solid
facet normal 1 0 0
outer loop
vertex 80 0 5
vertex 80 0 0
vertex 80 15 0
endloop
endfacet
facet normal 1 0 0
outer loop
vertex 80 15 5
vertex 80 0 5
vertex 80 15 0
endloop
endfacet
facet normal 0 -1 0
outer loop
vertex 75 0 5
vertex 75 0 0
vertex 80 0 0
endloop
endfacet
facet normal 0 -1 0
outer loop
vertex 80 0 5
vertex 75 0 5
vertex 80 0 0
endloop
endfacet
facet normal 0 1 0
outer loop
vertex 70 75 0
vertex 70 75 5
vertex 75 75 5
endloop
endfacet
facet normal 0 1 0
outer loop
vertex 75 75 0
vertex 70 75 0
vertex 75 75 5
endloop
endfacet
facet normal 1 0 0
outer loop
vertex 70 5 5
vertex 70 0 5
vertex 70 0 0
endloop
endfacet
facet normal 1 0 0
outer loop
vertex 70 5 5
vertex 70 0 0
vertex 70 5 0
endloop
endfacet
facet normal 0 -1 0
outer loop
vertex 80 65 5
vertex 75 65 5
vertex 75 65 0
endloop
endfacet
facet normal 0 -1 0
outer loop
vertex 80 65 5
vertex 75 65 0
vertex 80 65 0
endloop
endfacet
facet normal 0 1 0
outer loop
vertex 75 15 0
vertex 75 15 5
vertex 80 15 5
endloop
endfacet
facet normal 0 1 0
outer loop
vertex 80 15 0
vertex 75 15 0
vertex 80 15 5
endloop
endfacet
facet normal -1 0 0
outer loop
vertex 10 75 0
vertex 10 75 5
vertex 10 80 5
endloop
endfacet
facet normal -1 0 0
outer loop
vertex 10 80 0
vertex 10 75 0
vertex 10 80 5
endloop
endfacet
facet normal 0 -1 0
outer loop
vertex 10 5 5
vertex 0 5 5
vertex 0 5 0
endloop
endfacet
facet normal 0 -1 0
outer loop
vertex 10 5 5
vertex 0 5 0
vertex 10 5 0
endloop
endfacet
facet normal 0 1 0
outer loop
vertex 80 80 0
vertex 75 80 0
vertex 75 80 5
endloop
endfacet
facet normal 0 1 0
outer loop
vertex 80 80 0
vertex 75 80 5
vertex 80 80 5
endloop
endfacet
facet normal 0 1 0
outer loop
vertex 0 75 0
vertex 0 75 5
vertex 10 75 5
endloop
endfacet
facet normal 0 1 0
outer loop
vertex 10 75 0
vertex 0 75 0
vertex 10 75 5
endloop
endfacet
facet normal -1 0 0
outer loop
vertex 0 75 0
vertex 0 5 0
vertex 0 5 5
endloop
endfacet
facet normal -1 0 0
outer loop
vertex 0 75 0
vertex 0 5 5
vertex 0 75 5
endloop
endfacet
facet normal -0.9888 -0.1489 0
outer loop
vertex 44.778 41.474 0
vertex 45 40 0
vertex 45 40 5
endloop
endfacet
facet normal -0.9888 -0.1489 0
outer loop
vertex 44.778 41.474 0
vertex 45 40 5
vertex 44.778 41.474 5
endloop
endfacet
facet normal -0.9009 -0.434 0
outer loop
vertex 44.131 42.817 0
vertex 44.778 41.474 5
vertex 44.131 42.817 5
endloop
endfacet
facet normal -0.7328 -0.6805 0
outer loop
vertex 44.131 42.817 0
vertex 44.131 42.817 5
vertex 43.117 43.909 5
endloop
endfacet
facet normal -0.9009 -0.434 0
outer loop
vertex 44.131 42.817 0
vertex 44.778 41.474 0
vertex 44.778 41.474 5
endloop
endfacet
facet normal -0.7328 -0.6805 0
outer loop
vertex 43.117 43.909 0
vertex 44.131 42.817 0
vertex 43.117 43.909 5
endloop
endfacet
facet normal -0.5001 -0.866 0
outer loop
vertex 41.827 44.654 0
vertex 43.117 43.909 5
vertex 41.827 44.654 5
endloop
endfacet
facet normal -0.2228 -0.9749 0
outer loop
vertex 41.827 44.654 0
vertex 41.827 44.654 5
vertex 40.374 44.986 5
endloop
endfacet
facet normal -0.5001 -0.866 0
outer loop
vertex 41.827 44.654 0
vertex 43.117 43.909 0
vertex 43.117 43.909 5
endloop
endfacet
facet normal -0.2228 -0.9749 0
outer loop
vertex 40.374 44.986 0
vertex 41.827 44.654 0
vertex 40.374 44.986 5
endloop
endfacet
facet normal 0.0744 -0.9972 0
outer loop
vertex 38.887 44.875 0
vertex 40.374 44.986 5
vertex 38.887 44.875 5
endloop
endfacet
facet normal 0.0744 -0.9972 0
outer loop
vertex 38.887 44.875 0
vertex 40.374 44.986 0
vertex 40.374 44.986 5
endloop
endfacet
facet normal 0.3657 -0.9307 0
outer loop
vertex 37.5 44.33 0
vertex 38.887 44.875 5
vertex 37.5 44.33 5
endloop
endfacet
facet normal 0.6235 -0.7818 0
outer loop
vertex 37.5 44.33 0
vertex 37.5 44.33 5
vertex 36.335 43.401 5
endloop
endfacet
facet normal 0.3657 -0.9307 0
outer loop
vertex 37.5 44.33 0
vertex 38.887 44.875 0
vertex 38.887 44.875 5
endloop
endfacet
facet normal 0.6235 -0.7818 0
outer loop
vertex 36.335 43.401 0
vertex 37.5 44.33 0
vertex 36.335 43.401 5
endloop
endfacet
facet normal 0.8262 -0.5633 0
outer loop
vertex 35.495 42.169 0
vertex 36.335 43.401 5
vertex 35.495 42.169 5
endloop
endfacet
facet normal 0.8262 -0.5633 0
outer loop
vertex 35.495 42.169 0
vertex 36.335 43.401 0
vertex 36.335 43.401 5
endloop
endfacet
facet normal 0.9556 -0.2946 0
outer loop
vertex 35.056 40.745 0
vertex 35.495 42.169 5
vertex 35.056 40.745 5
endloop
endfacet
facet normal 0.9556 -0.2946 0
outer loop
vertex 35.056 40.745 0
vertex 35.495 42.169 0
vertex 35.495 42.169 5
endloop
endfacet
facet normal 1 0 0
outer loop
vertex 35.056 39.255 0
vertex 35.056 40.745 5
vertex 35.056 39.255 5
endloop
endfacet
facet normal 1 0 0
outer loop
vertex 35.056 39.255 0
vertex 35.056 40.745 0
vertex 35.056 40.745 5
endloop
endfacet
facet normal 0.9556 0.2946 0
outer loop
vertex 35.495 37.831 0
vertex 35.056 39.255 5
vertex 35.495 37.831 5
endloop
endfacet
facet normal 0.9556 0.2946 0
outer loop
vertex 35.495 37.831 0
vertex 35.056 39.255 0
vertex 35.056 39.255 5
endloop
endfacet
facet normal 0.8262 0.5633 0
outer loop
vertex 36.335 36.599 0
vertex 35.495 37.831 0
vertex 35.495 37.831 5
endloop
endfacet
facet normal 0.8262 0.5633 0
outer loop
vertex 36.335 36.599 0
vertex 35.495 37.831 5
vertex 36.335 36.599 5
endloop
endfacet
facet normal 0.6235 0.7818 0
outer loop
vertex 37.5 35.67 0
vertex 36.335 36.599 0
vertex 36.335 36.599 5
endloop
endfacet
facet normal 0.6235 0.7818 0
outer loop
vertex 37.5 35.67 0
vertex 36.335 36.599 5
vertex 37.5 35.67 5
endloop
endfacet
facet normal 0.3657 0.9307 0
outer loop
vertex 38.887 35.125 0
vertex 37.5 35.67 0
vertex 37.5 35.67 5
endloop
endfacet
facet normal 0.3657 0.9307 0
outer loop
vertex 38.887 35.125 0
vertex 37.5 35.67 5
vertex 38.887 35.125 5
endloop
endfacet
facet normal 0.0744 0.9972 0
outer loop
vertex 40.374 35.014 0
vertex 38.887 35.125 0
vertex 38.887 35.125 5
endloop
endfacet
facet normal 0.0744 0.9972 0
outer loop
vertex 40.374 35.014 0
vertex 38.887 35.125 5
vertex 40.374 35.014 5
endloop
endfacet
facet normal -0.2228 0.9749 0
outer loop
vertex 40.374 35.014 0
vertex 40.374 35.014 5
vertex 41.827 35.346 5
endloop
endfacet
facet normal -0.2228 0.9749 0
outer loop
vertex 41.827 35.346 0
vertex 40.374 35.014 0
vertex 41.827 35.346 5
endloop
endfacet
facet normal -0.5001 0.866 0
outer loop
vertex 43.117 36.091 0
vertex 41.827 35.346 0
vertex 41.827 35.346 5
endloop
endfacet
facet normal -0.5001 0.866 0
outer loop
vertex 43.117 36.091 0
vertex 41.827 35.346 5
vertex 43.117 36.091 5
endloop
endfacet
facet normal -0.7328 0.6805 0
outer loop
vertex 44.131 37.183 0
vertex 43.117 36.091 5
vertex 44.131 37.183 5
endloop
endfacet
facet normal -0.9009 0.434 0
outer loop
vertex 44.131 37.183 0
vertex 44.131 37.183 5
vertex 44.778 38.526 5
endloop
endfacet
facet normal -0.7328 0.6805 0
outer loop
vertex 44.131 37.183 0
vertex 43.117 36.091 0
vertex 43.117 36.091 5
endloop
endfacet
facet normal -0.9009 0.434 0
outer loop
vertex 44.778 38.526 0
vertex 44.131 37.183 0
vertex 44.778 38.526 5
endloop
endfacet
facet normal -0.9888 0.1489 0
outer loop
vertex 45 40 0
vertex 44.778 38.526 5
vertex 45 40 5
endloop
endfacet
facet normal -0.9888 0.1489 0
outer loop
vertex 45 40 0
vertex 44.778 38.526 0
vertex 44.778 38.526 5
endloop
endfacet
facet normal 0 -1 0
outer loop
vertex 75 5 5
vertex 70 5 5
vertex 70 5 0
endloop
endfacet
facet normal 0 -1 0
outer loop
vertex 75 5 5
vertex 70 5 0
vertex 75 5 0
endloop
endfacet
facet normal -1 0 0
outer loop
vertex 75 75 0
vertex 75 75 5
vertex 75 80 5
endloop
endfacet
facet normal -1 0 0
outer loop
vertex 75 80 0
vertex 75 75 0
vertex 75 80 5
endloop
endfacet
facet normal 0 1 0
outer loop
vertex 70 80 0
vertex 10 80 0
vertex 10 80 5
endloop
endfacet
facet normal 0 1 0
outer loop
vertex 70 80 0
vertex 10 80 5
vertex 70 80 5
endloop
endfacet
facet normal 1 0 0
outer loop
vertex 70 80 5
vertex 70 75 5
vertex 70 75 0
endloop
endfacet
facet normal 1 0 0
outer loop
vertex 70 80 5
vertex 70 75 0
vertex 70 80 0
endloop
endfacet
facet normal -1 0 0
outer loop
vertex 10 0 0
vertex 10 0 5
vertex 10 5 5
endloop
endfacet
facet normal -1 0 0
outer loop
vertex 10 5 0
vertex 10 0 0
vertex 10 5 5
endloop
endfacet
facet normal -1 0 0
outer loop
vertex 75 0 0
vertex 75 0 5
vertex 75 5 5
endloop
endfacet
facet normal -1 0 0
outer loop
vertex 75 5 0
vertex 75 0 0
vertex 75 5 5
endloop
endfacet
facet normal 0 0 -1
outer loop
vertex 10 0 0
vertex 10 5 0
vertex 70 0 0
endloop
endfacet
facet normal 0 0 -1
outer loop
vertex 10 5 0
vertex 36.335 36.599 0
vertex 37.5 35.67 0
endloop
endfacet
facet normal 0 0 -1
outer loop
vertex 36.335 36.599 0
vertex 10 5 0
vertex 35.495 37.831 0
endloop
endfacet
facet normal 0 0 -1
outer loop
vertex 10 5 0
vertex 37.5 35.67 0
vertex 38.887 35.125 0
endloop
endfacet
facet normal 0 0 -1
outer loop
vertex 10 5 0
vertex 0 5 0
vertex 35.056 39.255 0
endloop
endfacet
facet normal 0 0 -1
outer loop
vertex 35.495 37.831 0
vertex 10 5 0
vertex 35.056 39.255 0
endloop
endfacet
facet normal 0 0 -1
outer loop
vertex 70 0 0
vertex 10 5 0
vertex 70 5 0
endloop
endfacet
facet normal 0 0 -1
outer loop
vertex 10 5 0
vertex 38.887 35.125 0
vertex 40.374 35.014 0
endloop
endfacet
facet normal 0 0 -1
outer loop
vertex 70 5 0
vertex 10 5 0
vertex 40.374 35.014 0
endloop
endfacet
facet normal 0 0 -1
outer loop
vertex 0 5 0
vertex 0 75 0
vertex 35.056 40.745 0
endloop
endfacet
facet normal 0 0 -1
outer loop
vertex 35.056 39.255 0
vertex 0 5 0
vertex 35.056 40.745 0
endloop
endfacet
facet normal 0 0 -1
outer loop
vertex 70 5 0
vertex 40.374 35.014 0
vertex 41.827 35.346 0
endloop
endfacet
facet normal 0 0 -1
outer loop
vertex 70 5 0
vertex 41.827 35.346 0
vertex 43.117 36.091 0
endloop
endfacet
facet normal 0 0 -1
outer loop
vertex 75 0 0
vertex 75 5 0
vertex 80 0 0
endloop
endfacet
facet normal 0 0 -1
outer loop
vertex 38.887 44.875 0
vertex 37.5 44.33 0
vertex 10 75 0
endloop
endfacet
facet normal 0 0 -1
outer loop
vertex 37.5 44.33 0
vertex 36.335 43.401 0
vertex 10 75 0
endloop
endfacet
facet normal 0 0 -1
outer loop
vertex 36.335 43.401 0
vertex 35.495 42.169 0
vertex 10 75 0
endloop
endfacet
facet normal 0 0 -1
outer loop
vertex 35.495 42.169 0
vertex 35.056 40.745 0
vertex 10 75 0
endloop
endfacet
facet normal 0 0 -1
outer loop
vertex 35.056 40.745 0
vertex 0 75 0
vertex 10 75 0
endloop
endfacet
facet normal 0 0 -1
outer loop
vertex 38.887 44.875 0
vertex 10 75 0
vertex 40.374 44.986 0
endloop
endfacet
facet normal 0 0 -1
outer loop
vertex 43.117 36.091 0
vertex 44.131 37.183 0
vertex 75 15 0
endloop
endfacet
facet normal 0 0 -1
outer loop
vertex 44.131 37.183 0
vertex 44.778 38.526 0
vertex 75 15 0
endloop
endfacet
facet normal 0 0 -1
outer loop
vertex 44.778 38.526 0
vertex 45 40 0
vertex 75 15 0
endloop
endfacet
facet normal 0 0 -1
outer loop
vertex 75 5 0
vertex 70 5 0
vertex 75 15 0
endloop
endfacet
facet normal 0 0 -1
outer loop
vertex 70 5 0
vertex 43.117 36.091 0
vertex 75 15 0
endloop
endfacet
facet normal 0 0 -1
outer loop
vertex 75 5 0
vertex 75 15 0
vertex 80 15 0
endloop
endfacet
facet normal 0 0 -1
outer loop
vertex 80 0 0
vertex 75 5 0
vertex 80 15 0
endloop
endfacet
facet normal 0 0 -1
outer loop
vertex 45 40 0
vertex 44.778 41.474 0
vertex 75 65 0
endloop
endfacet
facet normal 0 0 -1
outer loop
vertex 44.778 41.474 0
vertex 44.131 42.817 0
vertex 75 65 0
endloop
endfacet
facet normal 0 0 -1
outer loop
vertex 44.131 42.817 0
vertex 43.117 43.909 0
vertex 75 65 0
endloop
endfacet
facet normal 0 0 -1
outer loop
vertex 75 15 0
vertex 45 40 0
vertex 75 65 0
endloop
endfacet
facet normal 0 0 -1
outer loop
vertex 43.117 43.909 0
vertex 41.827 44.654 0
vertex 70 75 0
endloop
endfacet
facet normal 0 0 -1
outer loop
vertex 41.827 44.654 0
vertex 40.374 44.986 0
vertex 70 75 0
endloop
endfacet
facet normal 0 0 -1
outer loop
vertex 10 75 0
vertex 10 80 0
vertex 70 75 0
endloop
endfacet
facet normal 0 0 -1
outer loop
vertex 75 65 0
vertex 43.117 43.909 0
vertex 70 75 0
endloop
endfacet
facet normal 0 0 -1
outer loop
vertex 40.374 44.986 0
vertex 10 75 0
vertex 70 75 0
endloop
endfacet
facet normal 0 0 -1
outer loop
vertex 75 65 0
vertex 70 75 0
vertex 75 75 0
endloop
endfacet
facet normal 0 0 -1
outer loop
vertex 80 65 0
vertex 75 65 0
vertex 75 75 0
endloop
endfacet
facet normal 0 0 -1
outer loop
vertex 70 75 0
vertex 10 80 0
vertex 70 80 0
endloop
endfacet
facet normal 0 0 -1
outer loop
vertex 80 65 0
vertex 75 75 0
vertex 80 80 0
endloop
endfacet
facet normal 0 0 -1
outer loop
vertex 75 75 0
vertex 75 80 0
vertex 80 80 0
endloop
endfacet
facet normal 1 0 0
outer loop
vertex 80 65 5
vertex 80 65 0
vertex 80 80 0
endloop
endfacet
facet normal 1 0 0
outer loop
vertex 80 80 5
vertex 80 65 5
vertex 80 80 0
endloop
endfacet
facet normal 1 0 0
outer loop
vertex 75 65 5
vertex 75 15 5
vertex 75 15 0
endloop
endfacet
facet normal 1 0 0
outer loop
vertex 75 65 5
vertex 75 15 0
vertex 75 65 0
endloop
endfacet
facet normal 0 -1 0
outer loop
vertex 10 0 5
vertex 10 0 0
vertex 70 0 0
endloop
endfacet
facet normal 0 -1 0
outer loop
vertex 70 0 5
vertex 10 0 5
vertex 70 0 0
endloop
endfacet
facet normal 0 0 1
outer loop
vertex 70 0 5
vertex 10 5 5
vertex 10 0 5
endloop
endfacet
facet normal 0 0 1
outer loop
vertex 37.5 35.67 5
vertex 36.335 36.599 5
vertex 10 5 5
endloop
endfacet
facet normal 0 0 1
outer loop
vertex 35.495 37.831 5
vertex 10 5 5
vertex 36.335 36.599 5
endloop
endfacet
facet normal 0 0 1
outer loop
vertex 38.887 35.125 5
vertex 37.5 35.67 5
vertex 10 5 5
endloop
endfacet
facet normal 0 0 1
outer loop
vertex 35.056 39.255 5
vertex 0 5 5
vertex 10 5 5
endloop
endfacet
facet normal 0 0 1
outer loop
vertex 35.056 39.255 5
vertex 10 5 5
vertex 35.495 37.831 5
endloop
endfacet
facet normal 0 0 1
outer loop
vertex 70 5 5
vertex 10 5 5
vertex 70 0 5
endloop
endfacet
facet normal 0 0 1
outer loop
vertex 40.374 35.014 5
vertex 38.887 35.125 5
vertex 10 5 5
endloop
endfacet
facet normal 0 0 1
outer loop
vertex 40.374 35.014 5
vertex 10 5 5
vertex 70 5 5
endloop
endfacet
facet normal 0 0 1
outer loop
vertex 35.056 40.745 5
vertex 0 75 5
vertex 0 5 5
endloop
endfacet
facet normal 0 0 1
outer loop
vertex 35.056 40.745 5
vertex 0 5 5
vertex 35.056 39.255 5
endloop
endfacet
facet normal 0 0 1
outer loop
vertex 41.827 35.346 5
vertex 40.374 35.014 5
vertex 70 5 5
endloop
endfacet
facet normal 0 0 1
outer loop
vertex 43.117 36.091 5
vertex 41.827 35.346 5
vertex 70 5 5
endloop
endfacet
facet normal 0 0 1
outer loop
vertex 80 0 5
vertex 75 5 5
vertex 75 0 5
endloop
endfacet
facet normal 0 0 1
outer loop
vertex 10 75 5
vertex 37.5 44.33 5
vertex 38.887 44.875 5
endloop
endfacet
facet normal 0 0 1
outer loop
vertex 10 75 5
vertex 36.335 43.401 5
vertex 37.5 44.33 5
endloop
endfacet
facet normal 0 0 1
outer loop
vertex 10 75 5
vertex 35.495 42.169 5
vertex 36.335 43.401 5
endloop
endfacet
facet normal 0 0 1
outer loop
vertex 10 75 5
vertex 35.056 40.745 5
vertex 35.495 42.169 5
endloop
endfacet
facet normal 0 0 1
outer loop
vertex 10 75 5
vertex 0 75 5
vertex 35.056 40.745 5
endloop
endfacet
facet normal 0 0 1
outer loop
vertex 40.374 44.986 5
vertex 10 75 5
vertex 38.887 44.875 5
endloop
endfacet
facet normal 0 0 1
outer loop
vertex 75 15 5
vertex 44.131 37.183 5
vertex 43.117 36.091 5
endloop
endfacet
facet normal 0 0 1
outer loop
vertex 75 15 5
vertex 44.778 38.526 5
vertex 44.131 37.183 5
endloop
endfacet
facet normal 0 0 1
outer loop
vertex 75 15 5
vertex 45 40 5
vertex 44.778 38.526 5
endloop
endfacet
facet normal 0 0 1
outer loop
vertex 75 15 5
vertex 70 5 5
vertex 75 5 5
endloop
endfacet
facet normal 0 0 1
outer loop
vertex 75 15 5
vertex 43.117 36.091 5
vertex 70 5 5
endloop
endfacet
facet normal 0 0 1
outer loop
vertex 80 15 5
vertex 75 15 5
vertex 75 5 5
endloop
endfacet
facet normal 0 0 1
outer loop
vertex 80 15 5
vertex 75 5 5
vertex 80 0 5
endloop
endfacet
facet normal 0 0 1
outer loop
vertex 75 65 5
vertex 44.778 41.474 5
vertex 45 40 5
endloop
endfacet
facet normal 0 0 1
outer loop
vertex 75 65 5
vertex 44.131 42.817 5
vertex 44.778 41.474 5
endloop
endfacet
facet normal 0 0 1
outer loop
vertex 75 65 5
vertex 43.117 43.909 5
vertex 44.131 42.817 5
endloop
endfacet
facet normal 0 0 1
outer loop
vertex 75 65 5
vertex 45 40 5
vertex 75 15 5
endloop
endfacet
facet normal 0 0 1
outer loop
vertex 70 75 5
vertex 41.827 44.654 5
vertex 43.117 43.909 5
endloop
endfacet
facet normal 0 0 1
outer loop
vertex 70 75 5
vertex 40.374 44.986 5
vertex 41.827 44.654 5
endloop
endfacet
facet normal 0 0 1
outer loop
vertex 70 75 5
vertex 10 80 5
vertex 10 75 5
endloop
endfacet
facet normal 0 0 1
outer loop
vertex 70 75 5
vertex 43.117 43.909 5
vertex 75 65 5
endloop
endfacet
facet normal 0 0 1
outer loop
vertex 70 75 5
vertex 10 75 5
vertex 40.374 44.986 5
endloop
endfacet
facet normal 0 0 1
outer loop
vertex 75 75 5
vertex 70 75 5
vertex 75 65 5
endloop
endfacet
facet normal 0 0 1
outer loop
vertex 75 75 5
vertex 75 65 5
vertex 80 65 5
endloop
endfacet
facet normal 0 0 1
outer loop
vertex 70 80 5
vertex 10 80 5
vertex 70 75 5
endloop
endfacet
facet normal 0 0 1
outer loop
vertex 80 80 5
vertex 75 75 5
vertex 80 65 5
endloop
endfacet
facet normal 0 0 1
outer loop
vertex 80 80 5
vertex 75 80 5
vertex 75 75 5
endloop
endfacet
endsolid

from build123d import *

# Parameters (mm, degrees)
ESQUISSE1_W        = 80
ESQUISSE1_H        = 80
ESQUISSE1_R        = 5
BOSS_EXTRU_1_DEPTH = 5
ESQUISSE2_W        = 10
ESQUISSE2_H        = 5
ESQUISSE2_W_2      = 5
ESQUISSE2_H_2      = 50
CR_NEAUX_DEPTH     = 5


with BuildPart() as part:
    # Esquisse1 → Boss.-Extru.1 (new body)
    with BuildSketch(Plane.XY):
        with Locations((40, 40)):
            Rectangle(ESQUISSE1_W, ESQUISSE1_H)
        with Locations((40, 40)):
            Circle(ESQUISSE1_R, mode=Mode.SUBTRACT)
    extrude(amount=BOSS_EXTRU_1_DEPTH)

    # Esquisse2 → Créneaux - (cut)
    with BuildSketch(Plane.XY.offset(5)):
        with Locations((5, 2.5)):
            Rectangle(ESQUISSE2_W, ESQUISSE2_H)
        with Locations((5, 77.5)):
            Rectangle(ESQUISSE2_W, ESQUISSE2_H)
        with Locations((77.5, 40)):
            Rectangle(ESQUISSE2_W_2, ESQUISSE2_H_2)
        with Locations((72.5, 77.5)):
            Rectangle(ESQUISSE2_W_2, ESQUISSE2_H)
        with Locations((72.5, 2.5)):
            Rectangle(ESQUISSE2_W_2, ESQUISSE2_H)
    extrude(amount=-CR_NEAUX_DEPTH, mode=Mode.SUBTRACT)


solid = part.part
